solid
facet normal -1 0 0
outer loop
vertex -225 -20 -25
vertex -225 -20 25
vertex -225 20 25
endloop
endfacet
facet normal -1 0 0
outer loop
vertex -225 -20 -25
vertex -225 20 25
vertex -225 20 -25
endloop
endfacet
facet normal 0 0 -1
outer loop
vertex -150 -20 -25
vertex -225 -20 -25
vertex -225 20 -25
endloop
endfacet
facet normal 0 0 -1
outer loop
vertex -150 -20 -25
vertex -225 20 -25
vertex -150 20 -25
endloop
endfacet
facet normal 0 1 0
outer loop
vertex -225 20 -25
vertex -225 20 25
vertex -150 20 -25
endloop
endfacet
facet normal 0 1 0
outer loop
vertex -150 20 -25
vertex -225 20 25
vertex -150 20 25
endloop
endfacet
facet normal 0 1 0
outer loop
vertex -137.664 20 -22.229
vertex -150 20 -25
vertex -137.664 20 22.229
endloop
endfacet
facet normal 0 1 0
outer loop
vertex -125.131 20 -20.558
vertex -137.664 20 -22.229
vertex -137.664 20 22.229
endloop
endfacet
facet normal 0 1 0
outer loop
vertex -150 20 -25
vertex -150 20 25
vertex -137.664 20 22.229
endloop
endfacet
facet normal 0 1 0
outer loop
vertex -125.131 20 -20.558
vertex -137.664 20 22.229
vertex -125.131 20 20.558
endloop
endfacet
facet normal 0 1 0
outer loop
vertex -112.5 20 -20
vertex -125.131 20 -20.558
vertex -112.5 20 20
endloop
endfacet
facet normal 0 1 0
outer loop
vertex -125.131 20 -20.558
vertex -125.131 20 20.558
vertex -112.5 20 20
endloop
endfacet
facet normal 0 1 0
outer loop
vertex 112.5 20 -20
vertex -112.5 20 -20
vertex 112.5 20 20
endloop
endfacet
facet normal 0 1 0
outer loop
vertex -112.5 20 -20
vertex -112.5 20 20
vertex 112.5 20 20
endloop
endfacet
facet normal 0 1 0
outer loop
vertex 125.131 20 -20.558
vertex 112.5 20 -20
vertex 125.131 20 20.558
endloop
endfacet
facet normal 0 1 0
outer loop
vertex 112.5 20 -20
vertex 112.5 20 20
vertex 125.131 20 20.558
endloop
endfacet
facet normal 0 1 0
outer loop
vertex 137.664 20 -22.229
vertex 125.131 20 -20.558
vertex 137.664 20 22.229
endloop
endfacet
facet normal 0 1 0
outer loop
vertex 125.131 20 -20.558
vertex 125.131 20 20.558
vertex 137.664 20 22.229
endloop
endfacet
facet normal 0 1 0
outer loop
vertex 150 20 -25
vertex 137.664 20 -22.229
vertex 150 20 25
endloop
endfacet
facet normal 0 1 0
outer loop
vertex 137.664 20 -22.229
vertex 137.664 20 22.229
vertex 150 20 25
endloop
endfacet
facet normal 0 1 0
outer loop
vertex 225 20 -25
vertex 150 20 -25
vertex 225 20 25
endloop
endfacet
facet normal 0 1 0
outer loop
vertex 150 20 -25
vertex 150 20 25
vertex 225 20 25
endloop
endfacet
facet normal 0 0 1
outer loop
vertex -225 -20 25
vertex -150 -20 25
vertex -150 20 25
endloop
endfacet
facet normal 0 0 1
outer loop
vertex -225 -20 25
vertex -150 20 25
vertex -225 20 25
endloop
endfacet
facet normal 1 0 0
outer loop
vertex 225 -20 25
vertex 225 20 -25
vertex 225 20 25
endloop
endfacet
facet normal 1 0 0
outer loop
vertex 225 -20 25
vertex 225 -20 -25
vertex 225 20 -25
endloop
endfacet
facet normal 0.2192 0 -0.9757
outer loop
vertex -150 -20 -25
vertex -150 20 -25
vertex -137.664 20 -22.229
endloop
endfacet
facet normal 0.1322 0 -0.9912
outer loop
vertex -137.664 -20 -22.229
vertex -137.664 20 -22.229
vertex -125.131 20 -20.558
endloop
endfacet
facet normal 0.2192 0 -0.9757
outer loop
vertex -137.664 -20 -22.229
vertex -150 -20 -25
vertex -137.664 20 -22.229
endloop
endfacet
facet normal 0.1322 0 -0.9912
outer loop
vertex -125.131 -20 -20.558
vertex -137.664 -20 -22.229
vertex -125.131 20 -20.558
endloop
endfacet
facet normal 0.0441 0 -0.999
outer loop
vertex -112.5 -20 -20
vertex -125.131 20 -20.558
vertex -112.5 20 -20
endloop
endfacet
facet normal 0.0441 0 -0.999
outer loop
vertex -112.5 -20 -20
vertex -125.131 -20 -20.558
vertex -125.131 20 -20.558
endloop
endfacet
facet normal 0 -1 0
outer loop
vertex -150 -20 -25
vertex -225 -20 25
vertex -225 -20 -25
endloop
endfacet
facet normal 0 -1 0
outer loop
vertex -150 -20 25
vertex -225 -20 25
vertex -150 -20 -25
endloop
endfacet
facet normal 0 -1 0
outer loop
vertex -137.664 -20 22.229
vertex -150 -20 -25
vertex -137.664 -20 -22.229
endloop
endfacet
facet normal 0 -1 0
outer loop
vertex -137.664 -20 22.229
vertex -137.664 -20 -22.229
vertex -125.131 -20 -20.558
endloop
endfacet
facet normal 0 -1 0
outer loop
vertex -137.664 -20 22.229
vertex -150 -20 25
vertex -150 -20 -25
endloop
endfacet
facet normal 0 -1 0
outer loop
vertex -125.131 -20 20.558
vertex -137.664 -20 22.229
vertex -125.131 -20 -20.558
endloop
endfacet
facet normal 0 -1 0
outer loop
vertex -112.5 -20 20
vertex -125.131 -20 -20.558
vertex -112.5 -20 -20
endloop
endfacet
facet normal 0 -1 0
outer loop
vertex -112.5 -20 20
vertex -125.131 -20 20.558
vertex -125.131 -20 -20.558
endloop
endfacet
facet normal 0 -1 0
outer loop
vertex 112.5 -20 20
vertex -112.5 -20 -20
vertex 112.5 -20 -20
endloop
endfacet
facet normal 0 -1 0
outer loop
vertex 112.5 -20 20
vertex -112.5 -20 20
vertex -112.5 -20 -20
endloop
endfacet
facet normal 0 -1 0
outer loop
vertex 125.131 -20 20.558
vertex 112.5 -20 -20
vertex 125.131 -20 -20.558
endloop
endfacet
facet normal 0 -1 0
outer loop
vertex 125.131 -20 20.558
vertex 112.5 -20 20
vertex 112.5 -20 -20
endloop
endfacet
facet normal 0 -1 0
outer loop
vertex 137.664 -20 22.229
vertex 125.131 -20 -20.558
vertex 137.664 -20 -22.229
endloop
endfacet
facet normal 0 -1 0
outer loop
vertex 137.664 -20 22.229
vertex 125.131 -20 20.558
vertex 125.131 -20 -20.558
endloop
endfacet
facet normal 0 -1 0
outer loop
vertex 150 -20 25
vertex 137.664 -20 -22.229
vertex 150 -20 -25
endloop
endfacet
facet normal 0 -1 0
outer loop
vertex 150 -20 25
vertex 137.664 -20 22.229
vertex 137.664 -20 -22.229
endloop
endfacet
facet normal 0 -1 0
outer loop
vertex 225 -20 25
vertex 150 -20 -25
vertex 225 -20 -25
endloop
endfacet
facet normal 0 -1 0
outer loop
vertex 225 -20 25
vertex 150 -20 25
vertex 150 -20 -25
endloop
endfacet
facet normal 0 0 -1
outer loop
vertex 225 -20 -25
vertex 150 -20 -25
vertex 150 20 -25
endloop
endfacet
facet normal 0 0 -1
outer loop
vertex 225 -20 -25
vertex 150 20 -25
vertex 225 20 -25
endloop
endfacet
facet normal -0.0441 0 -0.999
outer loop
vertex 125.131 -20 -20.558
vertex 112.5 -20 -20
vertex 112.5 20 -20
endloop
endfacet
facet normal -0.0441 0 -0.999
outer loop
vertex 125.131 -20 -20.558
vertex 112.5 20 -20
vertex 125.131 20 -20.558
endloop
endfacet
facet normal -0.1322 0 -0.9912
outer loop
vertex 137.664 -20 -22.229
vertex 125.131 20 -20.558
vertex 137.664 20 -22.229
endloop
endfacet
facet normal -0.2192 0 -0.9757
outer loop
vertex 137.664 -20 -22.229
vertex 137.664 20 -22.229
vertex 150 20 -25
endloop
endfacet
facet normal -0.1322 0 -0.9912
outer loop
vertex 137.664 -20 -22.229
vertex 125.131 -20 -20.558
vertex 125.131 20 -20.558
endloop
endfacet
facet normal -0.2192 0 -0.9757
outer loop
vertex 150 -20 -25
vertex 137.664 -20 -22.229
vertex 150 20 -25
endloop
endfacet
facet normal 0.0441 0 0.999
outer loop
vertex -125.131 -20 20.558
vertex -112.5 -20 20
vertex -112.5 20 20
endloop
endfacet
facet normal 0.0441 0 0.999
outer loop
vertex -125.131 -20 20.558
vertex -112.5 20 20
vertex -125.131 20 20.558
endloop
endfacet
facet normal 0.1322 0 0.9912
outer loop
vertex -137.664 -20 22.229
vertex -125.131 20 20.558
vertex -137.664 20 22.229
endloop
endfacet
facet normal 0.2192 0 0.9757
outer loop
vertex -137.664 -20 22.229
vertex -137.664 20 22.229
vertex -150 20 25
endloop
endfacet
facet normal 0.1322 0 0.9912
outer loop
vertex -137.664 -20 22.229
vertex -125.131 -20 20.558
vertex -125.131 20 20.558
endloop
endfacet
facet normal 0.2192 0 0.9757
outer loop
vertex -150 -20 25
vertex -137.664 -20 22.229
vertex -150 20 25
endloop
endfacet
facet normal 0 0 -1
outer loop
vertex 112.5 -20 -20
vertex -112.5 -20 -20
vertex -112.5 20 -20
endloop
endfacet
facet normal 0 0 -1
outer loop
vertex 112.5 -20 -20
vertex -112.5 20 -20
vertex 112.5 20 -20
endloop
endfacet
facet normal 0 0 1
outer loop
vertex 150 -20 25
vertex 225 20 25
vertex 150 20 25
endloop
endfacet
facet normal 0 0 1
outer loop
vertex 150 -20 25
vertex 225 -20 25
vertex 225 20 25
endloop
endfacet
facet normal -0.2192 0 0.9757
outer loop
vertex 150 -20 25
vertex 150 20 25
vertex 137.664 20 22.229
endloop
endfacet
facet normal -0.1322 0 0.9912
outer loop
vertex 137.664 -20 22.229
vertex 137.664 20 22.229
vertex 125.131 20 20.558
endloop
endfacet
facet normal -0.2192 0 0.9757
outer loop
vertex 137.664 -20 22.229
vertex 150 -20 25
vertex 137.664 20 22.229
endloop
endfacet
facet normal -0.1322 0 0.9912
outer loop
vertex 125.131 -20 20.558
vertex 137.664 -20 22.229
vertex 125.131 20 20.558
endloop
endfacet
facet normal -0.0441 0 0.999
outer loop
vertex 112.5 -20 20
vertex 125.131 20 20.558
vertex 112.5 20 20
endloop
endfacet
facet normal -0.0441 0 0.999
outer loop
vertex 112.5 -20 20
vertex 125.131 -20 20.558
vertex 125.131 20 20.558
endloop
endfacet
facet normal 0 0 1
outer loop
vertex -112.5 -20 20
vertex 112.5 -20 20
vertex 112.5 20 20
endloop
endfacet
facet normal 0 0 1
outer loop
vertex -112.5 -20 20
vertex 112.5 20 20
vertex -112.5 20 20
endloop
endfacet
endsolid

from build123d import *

# Parameters (mm, degrees)
F1_DEPTH = 20


with BuildPart() as f1:
    # F0 (on Front) → F1 (new body, symmetric)
    with BuildSketch(Plane.XZ):
        with BuildLine():
            ThreePointArc((150, 25), (131.415932, 21.255507), (112.5, 20))
            Line((112.5, 20), (0, 20))
            Line((0, 20), (-112.5, 20))
            ThreePointArc((-112.5, 20), (-131.415932, 21.255507), (-150, 25))
            Line((-150, 25), (-225, 25))
            Line((-225, 25), (-225, 0))
            Line((-225, 0), (-225, -25))
            Line((-225, -25), (-150, -25))
            ThreePointArc((-150, -25), (-131.415932, -21.255507), (-112.5, -20))
            Line((-112.5, -20), (0, -20))
            Line((0, -20), (112.5, -20))
            ThreePointArc((112.5, -20), (131.415932, -21.255507), (150, -25))
            Line((150, -25), (225, -25))
            Line((225, -25), (225, 0))
            Line((225, 0), (225, 25))
            Line((225, 25), (150, 25))
        make_face()
    extrude(amount=F1_DEPTH, both=True)


solid = f1.part
